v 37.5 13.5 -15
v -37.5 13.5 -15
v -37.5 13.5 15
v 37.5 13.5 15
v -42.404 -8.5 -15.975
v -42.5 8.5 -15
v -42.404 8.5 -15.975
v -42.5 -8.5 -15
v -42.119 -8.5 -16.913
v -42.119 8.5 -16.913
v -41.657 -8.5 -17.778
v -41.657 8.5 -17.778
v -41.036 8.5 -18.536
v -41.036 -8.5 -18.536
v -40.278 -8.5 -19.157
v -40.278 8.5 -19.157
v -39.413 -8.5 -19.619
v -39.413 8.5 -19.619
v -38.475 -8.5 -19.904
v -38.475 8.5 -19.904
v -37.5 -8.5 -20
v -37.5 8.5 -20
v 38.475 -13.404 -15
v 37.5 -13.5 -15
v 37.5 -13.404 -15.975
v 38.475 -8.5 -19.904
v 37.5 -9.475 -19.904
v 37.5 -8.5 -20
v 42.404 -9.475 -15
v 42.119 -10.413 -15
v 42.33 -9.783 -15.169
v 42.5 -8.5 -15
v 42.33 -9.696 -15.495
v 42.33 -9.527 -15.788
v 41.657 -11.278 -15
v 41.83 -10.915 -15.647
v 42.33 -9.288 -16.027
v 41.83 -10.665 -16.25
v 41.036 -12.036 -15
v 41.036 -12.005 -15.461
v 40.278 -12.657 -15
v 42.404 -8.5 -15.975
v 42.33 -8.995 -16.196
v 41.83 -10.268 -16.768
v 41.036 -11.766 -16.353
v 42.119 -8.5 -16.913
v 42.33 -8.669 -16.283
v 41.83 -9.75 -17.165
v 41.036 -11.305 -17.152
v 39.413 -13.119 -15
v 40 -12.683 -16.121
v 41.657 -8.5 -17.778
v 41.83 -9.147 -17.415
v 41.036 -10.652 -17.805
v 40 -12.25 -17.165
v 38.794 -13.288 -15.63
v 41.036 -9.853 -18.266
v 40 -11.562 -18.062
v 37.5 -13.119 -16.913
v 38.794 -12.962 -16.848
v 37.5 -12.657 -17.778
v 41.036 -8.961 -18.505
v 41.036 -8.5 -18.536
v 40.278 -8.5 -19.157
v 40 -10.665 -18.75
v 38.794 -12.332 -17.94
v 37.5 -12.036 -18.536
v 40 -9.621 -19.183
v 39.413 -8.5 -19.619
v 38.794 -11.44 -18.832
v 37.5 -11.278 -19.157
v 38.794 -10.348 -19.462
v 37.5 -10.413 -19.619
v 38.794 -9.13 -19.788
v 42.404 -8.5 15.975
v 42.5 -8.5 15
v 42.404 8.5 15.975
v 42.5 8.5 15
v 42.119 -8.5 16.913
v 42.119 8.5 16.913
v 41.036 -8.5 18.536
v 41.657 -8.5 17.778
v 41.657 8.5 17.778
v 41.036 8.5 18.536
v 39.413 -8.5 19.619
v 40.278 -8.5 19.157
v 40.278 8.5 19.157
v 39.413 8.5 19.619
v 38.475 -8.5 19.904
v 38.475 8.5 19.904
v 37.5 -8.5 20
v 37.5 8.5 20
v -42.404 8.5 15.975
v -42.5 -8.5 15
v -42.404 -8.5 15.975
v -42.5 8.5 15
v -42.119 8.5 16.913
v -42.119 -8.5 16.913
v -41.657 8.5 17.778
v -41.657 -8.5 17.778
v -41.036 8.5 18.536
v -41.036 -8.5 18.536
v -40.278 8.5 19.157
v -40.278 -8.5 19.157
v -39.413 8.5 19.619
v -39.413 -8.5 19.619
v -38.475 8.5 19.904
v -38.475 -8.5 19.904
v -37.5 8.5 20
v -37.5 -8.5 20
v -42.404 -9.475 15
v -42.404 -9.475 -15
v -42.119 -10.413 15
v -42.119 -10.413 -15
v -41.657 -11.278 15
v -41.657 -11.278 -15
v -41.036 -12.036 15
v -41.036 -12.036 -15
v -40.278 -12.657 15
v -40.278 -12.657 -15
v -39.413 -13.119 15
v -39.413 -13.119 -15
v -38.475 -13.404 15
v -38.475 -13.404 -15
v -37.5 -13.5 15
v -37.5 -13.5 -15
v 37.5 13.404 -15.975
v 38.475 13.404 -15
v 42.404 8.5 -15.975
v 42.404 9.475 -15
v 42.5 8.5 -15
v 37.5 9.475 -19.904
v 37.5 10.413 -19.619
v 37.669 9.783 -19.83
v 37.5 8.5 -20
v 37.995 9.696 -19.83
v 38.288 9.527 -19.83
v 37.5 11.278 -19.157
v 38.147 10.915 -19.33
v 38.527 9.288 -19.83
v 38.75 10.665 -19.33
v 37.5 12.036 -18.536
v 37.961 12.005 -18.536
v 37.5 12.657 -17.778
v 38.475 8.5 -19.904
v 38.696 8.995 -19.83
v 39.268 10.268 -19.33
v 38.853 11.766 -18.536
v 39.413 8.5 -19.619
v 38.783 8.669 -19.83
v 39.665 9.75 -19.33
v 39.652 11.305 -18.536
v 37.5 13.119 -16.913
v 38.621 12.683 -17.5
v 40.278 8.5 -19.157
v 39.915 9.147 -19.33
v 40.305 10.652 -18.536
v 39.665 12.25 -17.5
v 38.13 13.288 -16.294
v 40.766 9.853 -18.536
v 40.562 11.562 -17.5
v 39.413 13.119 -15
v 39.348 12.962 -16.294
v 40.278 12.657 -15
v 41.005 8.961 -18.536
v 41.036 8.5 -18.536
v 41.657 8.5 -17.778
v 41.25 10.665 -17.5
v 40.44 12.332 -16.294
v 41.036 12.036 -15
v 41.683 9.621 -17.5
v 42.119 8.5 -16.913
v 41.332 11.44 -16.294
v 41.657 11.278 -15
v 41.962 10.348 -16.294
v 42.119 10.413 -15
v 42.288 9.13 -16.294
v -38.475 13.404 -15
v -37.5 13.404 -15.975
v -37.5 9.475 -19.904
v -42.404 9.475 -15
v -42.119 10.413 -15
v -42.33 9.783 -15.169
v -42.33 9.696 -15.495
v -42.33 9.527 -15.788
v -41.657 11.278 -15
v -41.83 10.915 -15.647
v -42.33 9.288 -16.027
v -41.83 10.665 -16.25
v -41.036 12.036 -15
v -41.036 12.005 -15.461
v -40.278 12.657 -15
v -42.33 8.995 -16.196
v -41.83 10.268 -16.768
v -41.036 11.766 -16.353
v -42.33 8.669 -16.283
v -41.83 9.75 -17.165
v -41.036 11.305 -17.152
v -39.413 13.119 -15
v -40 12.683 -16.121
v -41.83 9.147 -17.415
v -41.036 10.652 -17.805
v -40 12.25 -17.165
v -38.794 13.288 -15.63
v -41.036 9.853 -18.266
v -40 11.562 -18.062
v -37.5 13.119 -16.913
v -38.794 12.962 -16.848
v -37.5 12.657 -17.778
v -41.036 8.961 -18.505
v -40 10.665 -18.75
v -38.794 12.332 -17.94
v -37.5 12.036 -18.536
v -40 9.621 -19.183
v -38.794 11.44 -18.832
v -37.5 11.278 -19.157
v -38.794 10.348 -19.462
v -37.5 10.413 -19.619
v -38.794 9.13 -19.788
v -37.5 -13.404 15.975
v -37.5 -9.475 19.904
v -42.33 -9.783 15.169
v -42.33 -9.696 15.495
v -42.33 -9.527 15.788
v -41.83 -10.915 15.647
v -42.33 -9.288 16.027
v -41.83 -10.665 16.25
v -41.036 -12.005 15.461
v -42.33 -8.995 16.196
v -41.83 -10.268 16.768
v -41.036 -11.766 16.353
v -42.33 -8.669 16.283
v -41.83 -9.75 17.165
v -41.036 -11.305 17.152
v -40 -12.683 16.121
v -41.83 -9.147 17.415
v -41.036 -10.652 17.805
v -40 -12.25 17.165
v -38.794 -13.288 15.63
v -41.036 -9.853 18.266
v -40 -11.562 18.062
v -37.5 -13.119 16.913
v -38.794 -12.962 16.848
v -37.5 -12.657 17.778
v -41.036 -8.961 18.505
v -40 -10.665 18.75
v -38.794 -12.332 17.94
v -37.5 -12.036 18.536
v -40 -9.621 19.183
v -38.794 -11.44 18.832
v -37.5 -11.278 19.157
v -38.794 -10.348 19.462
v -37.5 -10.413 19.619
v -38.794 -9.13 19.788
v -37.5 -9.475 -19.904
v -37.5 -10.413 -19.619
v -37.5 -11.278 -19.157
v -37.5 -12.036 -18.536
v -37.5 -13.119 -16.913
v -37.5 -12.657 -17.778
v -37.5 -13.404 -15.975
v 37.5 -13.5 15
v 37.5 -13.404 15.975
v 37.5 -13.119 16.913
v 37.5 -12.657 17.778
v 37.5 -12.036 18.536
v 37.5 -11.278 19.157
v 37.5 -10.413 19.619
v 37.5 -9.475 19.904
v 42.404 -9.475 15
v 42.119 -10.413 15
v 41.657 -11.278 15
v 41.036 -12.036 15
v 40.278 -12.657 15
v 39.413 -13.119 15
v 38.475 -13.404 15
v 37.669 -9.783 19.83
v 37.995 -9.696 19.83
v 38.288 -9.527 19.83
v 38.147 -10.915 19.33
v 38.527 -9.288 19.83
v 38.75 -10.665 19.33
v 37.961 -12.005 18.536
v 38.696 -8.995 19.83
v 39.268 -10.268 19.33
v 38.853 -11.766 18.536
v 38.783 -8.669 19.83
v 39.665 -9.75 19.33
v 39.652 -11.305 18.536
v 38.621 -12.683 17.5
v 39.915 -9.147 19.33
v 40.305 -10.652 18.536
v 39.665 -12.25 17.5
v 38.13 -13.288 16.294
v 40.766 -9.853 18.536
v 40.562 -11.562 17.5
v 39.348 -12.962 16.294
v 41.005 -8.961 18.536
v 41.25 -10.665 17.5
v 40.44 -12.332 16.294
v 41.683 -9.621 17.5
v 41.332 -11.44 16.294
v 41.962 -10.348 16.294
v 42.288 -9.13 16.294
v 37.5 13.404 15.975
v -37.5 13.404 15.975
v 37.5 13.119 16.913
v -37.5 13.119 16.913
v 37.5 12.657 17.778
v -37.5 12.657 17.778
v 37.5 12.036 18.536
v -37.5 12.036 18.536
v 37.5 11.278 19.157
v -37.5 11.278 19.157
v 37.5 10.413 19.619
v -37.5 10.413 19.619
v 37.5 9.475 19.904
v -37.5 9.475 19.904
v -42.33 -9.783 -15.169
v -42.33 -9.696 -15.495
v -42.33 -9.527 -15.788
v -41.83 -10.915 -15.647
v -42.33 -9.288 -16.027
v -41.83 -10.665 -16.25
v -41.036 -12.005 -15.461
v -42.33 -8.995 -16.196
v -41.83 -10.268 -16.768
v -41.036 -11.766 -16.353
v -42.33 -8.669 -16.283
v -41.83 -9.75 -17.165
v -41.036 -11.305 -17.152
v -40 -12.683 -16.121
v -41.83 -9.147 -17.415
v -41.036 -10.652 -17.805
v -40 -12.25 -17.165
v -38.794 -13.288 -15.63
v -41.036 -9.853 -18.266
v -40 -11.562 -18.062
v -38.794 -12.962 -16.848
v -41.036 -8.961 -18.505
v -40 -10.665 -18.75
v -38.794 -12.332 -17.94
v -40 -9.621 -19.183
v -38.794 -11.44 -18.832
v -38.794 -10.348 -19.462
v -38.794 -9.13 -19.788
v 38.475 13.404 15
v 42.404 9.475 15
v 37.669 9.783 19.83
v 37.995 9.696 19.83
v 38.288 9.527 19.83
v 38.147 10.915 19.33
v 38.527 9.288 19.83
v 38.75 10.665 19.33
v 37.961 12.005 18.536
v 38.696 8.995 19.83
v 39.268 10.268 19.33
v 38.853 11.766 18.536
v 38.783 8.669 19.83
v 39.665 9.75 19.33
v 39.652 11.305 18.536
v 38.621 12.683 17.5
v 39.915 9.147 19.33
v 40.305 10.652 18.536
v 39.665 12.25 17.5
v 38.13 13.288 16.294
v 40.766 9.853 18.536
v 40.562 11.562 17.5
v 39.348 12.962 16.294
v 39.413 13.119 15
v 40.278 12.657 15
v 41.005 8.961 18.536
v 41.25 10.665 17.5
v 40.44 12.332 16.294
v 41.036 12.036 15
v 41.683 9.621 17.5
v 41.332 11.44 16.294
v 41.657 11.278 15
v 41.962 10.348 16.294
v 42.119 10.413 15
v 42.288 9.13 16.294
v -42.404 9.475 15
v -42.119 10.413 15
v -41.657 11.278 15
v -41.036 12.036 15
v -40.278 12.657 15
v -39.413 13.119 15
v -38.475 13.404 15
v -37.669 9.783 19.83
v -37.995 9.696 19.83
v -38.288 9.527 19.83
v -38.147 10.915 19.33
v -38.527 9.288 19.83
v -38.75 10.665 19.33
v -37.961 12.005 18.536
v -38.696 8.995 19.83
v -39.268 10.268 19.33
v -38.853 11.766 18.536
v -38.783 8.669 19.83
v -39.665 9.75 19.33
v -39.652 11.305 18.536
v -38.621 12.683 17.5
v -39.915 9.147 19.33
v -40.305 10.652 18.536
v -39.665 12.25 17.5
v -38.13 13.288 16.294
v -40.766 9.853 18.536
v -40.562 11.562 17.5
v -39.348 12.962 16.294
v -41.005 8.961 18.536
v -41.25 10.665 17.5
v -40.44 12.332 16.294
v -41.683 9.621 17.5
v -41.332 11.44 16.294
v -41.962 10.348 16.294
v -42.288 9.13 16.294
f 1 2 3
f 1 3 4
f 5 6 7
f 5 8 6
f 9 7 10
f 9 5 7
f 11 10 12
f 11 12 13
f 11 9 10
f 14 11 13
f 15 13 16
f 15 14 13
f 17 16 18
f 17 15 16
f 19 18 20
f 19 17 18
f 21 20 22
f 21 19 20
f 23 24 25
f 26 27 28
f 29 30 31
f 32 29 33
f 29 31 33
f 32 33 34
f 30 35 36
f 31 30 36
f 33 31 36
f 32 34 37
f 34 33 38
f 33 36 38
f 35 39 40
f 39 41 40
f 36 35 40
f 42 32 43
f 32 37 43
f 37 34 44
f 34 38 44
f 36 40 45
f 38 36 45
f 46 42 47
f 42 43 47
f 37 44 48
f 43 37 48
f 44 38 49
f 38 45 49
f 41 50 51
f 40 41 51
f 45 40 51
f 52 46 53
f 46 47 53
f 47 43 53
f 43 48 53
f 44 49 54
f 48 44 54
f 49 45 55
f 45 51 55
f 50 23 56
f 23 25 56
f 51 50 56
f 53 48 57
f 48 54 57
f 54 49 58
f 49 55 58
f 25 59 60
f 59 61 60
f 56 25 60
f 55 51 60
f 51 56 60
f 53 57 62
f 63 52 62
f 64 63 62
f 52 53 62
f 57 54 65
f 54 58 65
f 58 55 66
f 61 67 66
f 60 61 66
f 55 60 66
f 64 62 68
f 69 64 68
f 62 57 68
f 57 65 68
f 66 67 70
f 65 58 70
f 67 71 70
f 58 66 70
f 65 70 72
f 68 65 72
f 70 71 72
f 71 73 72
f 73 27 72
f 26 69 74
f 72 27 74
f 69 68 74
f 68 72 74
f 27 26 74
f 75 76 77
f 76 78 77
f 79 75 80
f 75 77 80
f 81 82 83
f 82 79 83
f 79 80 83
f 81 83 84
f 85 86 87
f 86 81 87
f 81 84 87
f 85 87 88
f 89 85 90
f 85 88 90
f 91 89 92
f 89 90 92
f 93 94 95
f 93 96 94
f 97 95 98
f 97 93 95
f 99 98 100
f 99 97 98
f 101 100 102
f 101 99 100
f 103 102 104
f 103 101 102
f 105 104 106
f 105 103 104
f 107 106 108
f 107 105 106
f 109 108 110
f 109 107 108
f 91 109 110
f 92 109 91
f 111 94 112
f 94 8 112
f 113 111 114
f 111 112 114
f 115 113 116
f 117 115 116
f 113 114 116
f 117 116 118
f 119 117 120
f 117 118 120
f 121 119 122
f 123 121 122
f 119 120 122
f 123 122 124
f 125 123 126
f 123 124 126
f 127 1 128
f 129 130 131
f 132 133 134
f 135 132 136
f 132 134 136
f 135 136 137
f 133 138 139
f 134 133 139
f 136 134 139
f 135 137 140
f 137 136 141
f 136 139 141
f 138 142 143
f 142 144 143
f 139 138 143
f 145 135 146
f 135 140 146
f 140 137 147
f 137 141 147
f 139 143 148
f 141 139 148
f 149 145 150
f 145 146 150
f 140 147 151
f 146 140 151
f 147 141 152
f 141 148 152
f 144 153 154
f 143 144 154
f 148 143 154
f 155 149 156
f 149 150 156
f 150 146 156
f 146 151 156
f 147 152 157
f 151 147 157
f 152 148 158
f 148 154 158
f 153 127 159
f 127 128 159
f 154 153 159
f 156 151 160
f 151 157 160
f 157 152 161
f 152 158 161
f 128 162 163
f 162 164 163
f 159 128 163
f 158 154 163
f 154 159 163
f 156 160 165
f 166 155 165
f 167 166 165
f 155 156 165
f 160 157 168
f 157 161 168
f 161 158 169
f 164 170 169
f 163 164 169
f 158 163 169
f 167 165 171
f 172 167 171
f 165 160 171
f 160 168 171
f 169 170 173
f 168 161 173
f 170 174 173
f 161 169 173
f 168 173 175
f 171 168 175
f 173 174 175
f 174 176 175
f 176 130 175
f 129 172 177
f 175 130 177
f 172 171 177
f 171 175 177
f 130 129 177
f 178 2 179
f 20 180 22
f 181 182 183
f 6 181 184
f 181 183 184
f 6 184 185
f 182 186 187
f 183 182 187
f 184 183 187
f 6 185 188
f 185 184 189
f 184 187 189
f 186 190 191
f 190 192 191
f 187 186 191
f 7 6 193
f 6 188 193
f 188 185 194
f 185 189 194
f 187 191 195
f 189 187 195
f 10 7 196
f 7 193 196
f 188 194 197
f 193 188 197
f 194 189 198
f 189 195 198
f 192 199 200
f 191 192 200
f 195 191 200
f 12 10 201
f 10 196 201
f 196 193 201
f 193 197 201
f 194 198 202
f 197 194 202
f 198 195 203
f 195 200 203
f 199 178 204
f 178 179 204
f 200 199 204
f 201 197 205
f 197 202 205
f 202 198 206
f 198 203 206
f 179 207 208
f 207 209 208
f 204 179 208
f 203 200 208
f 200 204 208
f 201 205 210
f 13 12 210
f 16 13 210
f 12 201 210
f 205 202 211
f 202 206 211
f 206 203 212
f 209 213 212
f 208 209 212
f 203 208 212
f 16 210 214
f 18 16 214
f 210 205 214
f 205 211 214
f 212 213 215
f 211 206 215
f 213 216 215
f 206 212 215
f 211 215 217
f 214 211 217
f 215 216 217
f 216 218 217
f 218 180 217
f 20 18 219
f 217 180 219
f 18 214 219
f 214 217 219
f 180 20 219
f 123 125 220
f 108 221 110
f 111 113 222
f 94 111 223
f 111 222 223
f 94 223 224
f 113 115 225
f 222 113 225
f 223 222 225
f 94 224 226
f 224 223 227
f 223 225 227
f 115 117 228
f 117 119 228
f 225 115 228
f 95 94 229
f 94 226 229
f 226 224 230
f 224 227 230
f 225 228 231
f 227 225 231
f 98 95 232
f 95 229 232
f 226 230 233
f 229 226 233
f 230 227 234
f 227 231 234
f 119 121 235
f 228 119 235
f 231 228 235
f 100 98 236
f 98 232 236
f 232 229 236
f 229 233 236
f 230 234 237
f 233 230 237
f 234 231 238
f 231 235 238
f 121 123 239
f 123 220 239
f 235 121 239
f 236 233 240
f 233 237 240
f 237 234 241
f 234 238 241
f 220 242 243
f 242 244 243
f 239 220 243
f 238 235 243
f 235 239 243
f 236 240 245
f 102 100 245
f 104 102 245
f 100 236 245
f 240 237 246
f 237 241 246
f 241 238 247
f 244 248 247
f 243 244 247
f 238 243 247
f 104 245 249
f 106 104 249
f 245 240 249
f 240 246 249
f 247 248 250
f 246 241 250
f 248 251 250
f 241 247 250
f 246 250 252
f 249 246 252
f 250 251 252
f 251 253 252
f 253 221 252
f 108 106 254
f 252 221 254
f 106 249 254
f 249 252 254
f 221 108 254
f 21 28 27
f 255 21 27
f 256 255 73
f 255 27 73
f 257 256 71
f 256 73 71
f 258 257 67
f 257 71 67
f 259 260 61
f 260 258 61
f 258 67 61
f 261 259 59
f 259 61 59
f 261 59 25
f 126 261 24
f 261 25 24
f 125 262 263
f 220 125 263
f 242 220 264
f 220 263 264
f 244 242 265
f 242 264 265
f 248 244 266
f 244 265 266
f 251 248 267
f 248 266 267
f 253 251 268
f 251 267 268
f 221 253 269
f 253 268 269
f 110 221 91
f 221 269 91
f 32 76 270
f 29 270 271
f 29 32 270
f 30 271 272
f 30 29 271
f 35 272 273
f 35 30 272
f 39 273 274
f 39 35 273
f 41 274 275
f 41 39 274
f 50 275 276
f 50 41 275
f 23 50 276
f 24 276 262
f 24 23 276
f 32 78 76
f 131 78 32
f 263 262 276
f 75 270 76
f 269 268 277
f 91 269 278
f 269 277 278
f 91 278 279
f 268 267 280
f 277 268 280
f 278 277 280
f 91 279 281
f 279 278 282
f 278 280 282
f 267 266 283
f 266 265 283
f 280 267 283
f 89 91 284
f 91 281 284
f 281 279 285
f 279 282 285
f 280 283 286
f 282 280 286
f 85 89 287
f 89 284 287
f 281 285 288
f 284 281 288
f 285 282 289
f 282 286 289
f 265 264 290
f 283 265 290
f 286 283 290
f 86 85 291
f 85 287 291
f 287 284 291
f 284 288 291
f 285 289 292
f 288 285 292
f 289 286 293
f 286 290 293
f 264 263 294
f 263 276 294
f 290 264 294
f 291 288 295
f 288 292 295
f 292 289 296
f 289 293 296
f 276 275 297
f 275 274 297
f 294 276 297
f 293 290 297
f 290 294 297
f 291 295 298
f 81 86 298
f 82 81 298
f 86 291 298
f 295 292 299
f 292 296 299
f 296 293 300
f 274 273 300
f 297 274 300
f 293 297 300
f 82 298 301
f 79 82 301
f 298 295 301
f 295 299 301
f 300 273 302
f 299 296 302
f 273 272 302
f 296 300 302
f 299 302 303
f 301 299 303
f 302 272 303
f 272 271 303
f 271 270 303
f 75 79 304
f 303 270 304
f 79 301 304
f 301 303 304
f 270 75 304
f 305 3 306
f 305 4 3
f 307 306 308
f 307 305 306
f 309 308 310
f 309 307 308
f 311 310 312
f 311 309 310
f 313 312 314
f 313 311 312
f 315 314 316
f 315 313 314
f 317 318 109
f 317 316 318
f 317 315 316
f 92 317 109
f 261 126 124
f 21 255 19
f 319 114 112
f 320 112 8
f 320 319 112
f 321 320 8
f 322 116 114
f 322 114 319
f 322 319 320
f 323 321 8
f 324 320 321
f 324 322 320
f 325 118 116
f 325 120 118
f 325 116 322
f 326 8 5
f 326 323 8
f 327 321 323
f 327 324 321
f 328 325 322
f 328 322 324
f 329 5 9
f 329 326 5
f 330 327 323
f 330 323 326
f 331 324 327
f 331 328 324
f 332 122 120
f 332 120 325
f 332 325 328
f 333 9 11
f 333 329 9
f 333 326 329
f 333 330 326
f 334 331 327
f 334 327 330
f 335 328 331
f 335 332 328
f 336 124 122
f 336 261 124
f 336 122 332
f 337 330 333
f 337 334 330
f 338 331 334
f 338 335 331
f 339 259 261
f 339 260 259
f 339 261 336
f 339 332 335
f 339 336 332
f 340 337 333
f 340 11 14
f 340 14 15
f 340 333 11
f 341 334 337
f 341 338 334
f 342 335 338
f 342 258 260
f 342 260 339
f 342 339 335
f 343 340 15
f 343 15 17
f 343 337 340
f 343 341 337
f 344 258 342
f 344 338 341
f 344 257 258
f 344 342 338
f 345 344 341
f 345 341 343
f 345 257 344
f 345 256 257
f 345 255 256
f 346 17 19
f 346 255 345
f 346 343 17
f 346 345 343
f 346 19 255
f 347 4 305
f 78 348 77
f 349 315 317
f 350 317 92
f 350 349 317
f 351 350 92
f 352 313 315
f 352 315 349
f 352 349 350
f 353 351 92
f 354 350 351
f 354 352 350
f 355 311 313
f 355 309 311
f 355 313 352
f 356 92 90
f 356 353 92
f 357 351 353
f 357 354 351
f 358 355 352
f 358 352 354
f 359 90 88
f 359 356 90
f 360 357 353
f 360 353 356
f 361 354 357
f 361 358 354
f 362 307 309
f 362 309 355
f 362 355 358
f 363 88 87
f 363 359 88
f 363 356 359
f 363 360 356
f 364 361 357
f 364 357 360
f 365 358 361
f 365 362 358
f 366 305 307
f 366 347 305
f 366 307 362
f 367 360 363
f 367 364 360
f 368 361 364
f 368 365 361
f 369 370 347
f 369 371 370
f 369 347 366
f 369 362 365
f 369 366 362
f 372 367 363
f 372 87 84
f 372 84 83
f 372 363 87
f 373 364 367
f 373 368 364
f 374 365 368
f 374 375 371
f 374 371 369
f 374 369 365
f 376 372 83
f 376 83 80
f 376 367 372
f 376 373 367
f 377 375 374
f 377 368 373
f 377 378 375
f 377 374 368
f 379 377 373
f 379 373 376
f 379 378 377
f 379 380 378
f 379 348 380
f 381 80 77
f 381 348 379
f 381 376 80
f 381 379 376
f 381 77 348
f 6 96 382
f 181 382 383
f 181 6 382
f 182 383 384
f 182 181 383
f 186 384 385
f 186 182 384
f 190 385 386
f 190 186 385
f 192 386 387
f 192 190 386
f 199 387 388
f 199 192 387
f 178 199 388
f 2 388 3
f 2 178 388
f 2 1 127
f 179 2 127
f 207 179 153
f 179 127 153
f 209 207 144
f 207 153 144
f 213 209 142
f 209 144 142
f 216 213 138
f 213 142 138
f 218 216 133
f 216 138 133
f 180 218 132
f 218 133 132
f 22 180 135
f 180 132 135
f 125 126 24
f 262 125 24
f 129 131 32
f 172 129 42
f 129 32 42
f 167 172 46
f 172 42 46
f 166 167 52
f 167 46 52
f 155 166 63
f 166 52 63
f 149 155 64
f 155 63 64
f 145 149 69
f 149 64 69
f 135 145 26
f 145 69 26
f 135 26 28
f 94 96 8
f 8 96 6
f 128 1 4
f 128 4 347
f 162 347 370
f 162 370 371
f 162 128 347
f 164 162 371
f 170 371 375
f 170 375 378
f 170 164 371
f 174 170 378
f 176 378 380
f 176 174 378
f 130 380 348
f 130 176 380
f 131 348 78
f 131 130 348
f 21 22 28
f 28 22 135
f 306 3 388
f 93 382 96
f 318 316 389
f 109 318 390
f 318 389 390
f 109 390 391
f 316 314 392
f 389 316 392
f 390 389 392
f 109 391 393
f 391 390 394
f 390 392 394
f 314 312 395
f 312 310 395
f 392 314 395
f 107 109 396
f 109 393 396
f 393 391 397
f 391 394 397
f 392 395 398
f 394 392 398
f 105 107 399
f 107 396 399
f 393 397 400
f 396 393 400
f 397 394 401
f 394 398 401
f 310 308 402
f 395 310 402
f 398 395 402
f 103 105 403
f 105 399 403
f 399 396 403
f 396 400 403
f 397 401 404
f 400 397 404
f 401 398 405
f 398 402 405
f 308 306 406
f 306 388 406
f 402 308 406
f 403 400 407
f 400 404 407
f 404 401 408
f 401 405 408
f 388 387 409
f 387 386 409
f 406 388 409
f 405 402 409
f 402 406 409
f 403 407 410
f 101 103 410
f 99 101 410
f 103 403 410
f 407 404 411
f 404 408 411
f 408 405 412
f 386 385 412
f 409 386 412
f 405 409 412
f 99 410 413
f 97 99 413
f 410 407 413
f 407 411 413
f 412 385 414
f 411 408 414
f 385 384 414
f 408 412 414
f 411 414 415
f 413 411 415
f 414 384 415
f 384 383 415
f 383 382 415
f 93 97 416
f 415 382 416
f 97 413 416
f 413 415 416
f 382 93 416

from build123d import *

# Parameters (mm, degrees)
SKETCH_1_W      = 85
SKETCH_1_H      = 40
EXTRUDE_1_DEPTH = 13.5
FILLET_1_R      = 5


with BuildPart() as part:
    # 草图1 → 凸台-拉伸1 (new, symmetric)
    with BuildSketch(Plane(origin=(0, 0, 0), x_dir=(1, 0, 0), z_dir=(0, 1, 0))):
        Rectangle(SKETCH_1_W, SKETCH_1_H)
    extrude(amount=EXTRUDE_1_DEPTH, both=True)

    # 圆角1
    fillet_1_edges = [part.edges().sort_by_distance(p)[0] for p in [
        (42.5, 13.5, 0),
        (0, 13.5, -20),
        (-42.5, 13.5, 0),
        (0, -13.5, -20),
        (42.5, -13.5, 0),
        (0, -13.5, 20),
        (-42.5, -13.5, 0),
        (0, 13.5, 20),
        (-42.5, 0, -20),
        (42.5, 0, -20),
        (42.5, 0, 20),
        (-42.5, 0, 20),
    ]]
    fillet(fillet_1_edges, radius=FILLET_1_R)


solid = part.part
